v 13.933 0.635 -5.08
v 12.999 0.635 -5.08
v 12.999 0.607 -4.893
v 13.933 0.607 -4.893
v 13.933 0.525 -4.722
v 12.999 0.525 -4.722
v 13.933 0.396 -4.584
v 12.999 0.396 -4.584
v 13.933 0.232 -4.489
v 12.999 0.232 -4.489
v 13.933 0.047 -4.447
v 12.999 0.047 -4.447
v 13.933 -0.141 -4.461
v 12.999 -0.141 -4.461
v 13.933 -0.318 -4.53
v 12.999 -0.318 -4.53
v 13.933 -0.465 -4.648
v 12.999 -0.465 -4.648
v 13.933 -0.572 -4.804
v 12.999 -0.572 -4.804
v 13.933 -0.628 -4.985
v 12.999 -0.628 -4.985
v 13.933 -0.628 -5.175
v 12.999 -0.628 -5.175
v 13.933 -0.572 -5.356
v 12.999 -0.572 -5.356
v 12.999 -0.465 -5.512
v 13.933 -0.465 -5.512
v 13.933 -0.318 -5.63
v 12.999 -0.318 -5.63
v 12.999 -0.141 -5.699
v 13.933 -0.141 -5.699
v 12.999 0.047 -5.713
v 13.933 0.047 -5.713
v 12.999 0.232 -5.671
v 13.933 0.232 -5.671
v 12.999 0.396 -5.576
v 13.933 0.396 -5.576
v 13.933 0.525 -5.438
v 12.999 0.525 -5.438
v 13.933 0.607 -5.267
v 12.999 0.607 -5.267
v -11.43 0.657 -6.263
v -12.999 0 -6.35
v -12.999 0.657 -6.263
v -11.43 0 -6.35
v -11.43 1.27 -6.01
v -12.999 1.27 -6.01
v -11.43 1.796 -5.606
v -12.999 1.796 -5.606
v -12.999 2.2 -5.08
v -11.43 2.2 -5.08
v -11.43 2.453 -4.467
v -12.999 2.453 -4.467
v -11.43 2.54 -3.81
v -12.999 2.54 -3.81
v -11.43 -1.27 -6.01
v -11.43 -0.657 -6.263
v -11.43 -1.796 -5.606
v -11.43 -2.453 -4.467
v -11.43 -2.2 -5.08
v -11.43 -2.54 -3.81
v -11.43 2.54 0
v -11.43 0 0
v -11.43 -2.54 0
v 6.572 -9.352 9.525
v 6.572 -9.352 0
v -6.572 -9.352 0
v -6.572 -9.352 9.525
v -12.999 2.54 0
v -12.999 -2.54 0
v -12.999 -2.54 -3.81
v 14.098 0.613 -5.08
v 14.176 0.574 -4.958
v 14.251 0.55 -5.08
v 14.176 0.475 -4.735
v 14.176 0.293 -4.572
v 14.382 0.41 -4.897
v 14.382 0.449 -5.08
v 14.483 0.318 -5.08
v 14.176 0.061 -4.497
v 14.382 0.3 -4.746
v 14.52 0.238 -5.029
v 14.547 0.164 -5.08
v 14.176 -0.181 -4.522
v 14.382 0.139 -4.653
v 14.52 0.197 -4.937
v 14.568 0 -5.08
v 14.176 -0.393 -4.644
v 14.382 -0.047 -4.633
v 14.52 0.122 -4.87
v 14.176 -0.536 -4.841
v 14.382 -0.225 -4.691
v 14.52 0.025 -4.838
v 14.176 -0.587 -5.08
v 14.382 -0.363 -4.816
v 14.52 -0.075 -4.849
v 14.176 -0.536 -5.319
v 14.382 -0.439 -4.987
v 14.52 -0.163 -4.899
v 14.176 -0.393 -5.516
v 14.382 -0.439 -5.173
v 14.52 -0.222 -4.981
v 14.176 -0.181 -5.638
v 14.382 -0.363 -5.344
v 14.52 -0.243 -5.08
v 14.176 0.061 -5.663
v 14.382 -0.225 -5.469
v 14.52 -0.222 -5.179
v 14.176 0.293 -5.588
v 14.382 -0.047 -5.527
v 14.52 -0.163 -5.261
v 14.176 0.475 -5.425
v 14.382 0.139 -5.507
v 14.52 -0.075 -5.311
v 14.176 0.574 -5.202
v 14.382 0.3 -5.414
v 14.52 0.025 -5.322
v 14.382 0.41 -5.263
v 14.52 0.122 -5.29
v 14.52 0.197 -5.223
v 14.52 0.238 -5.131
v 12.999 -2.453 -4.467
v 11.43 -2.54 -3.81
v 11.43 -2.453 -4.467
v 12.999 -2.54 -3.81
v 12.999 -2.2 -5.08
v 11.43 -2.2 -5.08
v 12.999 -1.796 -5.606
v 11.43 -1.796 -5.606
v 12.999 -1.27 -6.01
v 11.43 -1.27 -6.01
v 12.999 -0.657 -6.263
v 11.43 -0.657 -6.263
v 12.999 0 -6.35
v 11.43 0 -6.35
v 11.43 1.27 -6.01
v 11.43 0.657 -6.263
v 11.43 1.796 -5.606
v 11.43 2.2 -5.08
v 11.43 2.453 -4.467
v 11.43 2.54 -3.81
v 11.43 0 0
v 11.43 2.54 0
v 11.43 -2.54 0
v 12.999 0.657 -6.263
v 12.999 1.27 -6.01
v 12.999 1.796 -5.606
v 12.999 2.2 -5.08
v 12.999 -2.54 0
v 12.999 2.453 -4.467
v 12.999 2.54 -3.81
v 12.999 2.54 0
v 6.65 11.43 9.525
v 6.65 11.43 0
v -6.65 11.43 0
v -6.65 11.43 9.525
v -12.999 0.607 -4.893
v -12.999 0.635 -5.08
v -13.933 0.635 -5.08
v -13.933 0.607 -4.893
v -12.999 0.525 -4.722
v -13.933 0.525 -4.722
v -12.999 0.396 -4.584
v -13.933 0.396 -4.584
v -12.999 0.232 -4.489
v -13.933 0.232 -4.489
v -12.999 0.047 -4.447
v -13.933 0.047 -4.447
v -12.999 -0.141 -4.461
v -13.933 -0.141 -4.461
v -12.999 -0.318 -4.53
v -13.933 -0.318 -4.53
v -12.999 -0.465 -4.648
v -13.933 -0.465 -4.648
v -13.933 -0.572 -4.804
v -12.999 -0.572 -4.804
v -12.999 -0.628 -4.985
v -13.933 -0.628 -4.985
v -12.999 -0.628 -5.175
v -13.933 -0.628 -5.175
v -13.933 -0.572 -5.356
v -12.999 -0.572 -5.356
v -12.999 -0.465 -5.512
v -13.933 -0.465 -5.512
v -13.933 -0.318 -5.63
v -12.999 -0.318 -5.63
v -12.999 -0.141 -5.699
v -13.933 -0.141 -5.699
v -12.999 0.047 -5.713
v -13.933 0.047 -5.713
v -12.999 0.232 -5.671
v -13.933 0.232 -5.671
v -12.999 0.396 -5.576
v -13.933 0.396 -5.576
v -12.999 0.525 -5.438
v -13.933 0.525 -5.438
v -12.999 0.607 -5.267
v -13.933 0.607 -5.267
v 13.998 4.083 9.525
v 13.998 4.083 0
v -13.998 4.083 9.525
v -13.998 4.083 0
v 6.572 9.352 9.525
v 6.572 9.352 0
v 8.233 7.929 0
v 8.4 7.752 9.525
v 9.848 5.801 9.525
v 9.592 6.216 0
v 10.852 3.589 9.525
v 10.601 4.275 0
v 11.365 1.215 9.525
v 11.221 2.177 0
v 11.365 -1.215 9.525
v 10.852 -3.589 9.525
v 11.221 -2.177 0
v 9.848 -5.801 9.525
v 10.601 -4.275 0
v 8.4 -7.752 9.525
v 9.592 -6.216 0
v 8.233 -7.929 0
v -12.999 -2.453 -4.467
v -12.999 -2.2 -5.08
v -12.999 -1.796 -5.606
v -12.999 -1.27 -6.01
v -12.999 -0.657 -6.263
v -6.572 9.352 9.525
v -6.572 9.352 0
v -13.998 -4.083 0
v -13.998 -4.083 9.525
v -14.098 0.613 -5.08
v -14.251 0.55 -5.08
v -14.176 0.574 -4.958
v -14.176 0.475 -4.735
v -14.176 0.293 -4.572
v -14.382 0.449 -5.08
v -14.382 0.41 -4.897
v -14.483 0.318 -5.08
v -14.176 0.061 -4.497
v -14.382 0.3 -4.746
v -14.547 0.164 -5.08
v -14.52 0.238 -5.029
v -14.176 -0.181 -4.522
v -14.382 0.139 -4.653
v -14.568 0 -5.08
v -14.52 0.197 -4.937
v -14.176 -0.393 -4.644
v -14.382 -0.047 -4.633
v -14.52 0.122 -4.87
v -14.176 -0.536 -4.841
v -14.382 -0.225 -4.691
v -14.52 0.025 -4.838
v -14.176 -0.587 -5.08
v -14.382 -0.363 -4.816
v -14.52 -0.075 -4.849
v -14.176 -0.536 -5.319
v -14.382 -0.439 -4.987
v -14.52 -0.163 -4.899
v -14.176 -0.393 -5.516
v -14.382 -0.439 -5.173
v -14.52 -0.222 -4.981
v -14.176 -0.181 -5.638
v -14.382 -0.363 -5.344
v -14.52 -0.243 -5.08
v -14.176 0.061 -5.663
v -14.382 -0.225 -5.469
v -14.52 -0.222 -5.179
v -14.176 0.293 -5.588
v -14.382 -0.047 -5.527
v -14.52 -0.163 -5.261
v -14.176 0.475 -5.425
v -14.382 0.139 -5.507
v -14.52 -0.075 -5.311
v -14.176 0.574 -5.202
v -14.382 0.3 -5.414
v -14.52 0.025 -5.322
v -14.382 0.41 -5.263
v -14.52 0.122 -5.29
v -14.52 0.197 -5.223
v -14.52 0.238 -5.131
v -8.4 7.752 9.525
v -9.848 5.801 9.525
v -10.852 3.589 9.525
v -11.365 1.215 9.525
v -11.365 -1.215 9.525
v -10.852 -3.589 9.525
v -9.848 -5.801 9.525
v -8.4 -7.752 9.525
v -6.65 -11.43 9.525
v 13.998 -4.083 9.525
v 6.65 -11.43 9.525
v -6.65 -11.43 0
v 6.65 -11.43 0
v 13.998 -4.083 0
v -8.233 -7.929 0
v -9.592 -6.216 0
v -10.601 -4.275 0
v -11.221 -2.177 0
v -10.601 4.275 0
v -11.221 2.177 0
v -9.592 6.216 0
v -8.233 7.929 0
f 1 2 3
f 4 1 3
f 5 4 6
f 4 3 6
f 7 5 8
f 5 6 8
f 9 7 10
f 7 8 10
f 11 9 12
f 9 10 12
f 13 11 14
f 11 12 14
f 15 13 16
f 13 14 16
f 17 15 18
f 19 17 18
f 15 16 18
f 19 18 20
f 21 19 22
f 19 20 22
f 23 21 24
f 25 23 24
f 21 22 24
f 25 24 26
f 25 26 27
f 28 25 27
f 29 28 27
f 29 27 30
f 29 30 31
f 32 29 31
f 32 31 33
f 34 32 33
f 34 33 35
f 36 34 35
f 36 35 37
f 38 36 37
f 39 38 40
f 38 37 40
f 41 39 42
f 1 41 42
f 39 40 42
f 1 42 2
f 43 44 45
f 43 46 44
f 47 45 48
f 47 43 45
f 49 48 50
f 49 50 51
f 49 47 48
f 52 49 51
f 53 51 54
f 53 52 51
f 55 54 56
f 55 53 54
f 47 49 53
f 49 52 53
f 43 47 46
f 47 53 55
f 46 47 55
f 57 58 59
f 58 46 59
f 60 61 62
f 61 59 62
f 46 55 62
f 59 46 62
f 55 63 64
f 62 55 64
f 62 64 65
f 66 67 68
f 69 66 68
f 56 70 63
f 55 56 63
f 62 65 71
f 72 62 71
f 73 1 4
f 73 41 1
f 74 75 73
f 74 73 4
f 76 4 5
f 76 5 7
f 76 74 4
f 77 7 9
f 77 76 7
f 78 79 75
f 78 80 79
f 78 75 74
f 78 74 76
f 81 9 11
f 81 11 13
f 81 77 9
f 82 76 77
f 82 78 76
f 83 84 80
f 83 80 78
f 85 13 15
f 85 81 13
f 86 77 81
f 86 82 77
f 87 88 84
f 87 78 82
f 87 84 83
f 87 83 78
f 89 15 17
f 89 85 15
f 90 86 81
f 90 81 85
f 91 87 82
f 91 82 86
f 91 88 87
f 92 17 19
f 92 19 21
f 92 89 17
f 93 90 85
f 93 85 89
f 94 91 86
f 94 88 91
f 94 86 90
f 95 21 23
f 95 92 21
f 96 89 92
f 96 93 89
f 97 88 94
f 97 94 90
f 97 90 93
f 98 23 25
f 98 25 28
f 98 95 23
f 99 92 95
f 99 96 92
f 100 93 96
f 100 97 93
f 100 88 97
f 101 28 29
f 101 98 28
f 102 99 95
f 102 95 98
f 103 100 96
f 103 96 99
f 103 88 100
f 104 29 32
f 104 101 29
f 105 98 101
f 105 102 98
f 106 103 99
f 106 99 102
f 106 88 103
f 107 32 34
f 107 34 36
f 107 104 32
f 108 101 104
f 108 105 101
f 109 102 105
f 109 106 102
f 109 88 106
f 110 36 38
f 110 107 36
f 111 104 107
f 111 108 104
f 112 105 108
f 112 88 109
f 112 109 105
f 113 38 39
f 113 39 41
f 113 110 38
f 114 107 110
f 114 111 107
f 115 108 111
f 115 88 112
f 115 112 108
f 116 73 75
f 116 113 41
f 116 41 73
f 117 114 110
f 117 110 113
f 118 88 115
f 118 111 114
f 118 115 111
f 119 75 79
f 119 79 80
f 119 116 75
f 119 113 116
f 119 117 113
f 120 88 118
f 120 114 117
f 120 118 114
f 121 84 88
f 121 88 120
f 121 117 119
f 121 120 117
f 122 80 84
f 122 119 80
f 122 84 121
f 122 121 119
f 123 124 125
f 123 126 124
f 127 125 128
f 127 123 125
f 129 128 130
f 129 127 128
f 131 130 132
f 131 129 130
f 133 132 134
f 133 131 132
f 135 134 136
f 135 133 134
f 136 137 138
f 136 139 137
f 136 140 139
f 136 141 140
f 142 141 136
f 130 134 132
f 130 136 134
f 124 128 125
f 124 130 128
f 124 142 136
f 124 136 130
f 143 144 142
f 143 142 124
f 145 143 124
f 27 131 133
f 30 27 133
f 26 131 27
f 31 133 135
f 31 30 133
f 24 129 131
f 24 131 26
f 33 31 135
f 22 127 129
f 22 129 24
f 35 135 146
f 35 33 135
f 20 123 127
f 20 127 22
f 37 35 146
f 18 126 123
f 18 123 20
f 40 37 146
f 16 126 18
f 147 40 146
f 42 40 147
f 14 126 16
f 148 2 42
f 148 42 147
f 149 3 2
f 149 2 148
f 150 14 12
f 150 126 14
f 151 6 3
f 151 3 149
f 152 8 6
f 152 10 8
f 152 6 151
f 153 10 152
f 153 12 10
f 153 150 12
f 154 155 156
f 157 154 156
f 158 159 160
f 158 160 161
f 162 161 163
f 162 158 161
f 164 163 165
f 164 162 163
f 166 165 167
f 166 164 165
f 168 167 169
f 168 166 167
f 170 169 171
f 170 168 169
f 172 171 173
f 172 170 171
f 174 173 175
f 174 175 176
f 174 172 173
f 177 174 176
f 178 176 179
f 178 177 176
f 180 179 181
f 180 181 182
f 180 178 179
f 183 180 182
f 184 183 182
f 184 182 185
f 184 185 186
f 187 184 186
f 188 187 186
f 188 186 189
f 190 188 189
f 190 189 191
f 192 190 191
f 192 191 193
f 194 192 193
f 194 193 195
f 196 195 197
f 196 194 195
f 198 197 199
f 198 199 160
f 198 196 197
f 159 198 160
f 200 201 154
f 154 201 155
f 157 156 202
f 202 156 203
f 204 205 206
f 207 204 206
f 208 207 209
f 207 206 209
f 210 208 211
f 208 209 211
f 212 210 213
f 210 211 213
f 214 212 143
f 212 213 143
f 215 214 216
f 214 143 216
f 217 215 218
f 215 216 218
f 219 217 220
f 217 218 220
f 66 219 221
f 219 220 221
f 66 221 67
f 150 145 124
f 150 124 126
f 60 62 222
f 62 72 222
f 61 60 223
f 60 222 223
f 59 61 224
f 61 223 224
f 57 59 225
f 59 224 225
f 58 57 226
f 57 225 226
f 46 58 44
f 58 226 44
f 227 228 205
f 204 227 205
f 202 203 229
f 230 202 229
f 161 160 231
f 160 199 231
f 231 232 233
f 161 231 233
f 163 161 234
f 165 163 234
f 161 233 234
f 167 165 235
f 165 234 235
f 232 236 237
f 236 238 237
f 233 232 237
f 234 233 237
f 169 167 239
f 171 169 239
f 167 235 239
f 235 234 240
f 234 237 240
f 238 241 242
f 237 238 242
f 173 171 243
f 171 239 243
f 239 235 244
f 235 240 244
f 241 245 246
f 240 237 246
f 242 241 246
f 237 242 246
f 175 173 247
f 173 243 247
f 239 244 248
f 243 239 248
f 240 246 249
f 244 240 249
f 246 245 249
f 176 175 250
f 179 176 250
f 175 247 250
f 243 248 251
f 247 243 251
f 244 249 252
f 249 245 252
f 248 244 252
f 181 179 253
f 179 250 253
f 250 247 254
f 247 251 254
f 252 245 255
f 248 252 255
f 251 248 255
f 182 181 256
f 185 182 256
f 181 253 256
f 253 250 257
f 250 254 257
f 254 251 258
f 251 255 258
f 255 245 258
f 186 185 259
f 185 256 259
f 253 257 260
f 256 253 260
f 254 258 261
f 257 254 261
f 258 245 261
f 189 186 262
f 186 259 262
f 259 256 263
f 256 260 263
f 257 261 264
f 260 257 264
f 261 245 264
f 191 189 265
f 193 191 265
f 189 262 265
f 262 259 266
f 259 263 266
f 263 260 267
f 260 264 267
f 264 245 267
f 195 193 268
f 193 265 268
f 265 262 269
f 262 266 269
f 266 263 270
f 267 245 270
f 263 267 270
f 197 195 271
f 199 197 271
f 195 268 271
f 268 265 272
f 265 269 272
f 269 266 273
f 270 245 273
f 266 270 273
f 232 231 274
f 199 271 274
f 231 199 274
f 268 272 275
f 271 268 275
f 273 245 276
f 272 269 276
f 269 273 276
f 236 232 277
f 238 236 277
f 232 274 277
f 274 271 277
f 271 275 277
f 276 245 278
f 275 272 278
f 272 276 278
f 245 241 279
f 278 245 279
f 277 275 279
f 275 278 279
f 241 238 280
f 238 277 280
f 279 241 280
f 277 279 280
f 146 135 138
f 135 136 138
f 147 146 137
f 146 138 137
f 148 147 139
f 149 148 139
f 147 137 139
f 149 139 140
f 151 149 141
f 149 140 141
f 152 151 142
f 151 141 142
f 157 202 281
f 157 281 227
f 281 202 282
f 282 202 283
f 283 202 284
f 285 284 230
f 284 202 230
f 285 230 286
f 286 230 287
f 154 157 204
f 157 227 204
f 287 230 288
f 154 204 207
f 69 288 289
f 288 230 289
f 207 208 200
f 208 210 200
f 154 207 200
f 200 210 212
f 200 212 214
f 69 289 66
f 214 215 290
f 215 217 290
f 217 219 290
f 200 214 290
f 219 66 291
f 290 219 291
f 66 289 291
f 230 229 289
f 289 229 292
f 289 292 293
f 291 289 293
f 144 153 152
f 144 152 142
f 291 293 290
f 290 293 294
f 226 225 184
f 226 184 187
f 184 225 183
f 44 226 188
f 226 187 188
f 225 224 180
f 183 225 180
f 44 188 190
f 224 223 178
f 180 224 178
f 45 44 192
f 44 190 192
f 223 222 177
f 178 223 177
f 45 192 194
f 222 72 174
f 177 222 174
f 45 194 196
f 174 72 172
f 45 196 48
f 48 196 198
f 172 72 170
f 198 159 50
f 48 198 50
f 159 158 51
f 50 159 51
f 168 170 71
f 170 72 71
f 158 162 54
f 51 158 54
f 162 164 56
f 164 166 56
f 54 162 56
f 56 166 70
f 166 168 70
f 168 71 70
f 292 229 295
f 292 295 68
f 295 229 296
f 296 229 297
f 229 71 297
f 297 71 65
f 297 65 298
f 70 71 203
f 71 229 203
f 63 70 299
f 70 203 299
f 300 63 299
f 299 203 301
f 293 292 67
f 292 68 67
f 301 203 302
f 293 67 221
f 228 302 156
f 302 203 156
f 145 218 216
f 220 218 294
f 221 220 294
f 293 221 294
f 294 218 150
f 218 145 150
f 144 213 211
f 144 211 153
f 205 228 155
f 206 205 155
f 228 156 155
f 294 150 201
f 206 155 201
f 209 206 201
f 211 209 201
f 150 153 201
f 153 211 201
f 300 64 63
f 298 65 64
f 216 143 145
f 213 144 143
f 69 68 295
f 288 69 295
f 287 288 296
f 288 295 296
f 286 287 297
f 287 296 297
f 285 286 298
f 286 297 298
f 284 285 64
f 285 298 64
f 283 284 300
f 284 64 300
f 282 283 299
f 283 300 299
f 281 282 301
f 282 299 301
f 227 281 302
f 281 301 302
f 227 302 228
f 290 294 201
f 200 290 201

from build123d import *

# Parameters (mm, degrees)
F1_DEPTH  = 19.05
F3_DEPTH  = 6.35
F4_R      = 0.635
F5_DEPTH  = 1.5691231
F6_R      = 2.53999
F7_R      = 0.635
F9_DEPTH  = 6.35
F11_D     = 2.54
F16_D     = 127
F16_DEPTH = 15.876


# Not quite as in the source:
# - a fillet or chamfer is up to 0.001 mm smaller than in the source, because OpenCascade refuses the exact size
# - a length typed as a fraction of an inch, garbled in the dataset ("3 / 203.2 mm" for 3/8 in), is restored
# - the program builds the solid bodies; features that only make, move or delete a surface that nothing else refers to are left out


with BuildPart() as f1:
    # F0 (on Top) → F1 (new body)
    with BuildSketch(Plane.XY):
        Polygon((6.6501818182, 11.43), (0, 11.43), (-6.6501818182, 11.43), (-13.9976640991, 4.0825177191), (-13.9976640991, 0), (-13.9976640991, -4.0825177191), (-6.6501818182, -11.43), (0, -11.43), (6.6501818182, -11.43), (13.9976640991, -4.0825177191), (13.9976640991, 0), (13.9976640991, 4.0825177191), align=None)
        with BuildLine():
            ThreePointArc((6.5717879374, 9.3518181818), (10.1429886159, 5.26922024), (11.43, 0))
            ThreePointArc((11.43, 0), (10.1429886159, -5.26922024), (6.5717879374, -9.3518181818))
            Line((6.5717879374, -9.3518181818), (0, -9.3518181818))
            Line((0, -9.3518181818), (-6.5717879374, -9.3518181818))
            ThreePointArc((-6.5717879374, -9.3518181818), (-10.1429886159, -5.26922024), (-11.43, 0))
            ThreePointArc((-11.43, 0), (-10.1429886159, 5.26922024), (-6.5717879374, 9.3518181818))
            Line((-6.5717879374, 9.3518181818), (0, 9.3518181818))
            Line((0, 9.3518181818), (6.5717879374, 9.3518181818))
        make_face(mode=Mode.SUBTRACT)
    extrude(amount=F1_DEPTH)

    # F2 (on Top) → F3 (join)
    with BuildSketch(Plane.XY):
        Polygon((12.9991231, -2.54), (12.9991231, 0), (12.9991231, 2.54), (11.43, 2.54), (11.43, 0), (11.43, -2.54), align=None)
    extrude(amount=-F3_DEPTH)

    # F4 (on face) → F5 (join)
    with BuildSketch(Plane.YZ.offset(12.9991231)):
        with Locations((0, -5.08)):
            Circle(F4_R)
    extrude(amount=F5_DEPTH)

    # F6 (radius 2.54 in the source; OpenCascade refuses exactly that, so slightly less here)
    f6_edges = [f1.edges().sort_by_distance(p)[0] for p in [
        (12.214562, -2.54, -6.35),
        (12.214562, 2.54, -6.35),
    ]]
    fillet(f6_edges, radius=F6_R)

    # F7
    f7_edges = [f1.edges().sort_by_distance(p)[0] for p in [
        (14.568246, -0.635, -5.08),
    ]]
    fillet(f7_edges, radius=F7_R)

    # F8 (on face) → F9 (join)
    with BuildSketch(Plane.XY.offset(19.05)):
        Polygon((13.9976640991, 2.54), (12.4285360385, 2.54), (12.4285360385, 0), (12.4285360385, -2.54), (13.9976640991, -2.54), (13.9976640991, 0), align=None)
    extrude(amount=F9_DEPTH)

    # F11 (through all)
    with Locations(Plane.YZ.offset(13.9976640991)):
        with Locations((0, 22.86)):
            Hole(F11_D / 2)

    # F12: F1 across plane


with BuildPart() as f1_1:
    add(f1.part)
    add(f1.part.mirror(Plane.YZ))

    # F16 (through all, one way)
    with BuildSketch(Plane(origin=(0, 0, 9.525), x_dir=(1, 0, 0), z_dir=(0, 0, -1))):
        with Locations((0, 0)):
            Circle(F16_D / 2)
    extrude(amount=-F16_DEPTH, mode=Mode.SUBTRACT)


solid = f1_1.part
